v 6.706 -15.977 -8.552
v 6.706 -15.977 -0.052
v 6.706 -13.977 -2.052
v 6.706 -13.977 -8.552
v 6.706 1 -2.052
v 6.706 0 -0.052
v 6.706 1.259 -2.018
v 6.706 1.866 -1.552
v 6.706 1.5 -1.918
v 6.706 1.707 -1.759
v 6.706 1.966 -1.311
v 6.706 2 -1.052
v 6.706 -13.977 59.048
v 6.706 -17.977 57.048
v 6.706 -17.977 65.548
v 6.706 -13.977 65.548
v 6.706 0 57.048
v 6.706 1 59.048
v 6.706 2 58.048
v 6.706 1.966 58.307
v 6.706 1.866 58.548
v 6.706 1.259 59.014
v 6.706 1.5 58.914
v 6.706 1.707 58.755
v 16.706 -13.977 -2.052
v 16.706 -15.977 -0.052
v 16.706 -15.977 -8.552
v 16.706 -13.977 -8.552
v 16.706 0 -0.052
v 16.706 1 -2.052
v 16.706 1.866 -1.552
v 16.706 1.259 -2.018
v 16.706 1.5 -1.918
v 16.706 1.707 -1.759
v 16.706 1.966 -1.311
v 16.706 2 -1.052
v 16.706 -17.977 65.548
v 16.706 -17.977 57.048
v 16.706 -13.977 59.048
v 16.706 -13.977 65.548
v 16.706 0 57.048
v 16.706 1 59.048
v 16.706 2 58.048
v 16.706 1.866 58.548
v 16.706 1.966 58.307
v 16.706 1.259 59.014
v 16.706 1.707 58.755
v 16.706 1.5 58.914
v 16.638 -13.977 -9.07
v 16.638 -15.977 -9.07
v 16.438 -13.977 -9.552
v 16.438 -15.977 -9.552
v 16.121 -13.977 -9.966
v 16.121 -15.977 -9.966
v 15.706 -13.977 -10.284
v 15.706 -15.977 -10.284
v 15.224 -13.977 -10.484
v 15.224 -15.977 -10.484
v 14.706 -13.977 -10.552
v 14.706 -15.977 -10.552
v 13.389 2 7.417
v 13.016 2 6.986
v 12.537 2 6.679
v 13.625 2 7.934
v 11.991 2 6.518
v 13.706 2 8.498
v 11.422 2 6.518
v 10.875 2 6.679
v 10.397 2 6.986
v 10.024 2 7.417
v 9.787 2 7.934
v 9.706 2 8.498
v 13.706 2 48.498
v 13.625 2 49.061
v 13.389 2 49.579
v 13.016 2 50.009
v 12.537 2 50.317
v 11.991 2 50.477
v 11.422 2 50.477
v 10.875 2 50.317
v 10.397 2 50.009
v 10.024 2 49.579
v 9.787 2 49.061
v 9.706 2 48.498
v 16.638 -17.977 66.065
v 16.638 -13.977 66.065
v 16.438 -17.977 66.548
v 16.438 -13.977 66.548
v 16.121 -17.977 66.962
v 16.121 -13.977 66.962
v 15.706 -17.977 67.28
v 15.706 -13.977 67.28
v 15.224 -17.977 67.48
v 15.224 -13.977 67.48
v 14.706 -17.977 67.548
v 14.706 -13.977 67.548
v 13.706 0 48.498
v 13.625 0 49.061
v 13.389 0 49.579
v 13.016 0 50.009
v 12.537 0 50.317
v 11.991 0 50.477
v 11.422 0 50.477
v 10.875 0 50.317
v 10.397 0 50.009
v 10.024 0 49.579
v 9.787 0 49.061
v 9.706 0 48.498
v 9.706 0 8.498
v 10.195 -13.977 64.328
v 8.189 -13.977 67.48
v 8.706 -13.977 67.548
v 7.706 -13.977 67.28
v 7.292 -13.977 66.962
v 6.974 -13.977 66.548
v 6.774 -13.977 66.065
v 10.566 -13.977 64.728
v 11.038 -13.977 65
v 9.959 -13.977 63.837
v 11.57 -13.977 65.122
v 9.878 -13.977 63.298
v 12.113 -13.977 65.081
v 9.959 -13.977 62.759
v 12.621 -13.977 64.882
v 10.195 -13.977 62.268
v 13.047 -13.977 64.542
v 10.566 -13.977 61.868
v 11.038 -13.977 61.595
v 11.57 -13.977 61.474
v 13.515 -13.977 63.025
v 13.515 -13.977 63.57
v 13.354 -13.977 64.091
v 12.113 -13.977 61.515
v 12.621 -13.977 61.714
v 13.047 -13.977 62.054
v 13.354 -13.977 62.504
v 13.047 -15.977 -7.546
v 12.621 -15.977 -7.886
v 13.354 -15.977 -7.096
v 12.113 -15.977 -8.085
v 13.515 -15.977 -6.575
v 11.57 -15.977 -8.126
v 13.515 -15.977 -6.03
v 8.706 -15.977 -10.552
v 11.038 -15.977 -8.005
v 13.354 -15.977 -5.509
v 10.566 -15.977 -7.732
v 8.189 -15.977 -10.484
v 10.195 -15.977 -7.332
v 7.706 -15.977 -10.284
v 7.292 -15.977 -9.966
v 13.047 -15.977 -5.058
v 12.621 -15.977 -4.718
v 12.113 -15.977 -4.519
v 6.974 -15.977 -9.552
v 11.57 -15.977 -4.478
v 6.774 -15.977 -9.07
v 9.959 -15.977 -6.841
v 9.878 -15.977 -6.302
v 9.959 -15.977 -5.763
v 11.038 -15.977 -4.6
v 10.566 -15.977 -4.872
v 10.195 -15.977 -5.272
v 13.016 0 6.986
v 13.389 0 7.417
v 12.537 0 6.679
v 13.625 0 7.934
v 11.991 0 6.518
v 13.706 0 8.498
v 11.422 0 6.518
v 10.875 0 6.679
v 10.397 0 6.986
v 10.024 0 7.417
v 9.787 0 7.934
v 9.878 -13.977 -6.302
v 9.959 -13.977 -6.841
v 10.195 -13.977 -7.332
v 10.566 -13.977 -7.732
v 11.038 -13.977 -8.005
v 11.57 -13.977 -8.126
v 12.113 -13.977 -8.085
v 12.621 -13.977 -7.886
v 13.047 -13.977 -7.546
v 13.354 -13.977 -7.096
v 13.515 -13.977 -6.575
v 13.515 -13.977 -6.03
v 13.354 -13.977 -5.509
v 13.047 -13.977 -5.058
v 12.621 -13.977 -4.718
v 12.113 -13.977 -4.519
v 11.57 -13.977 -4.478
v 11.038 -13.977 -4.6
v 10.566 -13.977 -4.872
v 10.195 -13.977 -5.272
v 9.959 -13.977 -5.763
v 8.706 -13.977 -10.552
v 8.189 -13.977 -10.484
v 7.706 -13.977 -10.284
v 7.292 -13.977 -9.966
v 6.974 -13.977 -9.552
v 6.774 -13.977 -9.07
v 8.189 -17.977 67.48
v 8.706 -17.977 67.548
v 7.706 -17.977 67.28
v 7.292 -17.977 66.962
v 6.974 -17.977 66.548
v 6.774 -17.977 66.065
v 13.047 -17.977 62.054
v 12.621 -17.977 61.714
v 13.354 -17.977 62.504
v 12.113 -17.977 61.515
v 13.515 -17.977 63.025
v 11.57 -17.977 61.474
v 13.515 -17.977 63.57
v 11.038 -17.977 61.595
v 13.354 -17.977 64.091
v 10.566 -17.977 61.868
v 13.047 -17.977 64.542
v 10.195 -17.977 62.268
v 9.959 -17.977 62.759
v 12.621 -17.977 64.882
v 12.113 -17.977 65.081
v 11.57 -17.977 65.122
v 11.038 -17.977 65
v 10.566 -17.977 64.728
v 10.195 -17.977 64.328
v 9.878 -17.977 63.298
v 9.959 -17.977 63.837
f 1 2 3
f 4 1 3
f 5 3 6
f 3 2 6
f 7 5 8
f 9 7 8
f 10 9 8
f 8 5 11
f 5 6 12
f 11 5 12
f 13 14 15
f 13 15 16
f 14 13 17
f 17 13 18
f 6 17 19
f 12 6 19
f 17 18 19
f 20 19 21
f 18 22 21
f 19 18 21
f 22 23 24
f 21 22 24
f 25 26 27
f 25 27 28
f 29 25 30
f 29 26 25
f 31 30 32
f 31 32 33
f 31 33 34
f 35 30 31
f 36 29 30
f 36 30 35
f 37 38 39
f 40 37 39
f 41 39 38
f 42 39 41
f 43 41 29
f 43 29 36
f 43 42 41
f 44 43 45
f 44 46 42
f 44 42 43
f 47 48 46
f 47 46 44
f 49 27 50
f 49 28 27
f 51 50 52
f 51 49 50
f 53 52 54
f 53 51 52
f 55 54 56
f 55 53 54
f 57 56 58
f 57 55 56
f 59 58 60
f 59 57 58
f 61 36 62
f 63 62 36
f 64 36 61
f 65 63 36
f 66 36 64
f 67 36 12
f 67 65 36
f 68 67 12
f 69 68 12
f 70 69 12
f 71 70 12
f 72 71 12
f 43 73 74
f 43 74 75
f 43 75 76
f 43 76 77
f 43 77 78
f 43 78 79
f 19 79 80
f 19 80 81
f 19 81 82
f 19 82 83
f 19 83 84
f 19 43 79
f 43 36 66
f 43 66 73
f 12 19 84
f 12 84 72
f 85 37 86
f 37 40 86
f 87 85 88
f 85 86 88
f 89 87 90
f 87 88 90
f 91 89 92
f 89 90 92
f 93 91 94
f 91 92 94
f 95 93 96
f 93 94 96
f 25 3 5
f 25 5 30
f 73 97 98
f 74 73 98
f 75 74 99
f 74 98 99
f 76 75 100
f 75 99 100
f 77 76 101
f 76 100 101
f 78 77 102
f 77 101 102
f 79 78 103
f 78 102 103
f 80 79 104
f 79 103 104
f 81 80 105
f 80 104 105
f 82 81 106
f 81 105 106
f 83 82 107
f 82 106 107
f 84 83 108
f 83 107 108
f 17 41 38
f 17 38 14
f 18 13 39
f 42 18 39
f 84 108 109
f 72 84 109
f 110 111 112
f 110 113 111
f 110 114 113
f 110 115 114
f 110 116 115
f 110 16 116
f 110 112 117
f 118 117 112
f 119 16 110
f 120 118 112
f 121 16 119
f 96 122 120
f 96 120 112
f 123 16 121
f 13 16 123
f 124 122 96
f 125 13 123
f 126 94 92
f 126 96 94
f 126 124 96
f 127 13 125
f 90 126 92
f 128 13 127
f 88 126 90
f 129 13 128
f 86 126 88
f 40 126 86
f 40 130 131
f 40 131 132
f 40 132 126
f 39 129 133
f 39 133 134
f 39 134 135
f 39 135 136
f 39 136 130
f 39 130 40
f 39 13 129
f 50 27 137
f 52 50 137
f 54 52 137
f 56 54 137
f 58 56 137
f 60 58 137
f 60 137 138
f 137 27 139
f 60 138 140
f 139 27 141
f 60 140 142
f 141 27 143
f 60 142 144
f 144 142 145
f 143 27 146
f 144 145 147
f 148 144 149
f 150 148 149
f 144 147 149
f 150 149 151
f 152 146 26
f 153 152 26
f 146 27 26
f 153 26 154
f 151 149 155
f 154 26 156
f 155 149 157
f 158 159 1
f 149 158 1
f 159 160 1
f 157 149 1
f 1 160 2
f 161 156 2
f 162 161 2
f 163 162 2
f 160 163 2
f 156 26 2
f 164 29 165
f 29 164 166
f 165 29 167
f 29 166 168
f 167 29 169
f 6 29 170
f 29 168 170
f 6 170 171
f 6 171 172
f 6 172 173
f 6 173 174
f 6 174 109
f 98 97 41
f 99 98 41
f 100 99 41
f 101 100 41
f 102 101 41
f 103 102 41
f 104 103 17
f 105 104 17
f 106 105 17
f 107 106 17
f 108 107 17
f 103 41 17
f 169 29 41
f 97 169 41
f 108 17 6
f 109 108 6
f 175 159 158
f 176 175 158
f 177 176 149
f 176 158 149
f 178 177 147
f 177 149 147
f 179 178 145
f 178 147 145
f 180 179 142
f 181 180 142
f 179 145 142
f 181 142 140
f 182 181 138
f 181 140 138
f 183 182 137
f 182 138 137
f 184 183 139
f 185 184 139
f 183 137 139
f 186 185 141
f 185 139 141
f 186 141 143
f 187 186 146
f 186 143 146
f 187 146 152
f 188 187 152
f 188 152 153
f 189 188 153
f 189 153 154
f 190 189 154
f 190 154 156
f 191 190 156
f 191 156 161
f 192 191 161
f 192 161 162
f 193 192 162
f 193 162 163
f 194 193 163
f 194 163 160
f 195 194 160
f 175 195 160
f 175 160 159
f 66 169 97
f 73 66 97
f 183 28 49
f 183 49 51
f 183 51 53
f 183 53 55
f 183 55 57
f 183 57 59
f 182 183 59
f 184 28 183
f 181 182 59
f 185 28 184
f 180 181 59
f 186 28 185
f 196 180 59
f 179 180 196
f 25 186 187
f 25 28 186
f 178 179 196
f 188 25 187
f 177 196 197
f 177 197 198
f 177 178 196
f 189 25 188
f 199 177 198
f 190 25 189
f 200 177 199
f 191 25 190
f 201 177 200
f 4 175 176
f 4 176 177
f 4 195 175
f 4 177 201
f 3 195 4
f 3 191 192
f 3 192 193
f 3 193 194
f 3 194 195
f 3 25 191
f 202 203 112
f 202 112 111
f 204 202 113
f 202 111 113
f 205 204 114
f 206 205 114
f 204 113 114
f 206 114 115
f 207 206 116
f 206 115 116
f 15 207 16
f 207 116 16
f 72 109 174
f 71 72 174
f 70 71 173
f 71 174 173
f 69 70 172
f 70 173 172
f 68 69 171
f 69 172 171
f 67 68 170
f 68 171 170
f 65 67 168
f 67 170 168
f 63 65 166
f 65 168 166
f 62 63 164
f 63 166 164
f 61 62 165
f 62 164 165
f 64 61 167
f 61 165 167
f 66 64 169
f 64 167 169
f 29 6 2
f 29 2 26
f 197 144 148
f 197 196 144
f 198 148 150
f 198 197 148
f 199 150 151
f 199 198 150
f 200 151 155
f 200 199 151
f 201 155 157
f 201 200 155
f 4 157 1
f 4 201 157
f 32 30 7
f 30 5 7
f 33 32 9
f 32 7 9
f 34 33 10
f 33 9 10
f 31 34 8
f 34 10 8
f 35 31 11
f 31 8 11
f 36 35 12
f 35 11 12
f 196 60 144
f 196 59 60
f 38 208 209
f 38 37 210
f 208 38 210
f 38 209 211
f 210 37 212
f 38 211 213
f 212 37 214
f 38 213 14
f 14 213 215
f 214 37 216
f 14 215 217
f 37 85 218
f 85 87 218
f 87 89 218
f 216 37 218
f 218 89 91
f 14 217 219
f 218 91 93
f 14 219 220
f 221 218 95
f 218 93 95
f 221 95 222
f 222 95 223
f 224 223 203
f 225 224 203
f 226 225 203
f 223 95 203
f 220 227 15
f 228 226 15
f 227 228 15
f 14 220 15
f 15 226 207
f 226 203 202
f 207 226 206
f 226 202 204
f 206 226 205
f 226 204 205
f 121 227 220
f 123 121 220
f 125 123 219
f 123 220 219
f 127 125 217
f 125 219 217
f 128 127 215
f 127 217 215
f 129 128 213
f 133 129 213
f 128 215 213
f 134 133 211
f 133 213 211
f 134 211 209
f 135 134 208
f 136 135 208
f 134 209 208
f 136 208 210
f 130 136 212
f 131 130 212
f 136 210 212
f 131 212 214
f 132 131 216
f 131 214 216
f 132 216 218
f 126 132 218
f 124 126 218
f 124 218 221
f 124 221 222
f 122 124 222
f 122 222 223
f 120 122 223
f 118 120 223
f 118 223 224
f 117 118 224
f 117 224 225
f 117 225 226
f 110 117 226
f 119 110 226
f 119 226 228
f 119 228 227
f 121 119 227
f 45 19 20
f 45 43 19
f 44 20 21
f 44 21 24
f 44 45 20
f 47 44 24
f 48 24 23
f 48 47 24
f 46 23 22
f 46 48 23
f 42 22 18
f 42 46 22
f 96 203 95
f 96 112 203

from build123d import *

# Parameters (mm, degrees)
SKETCH4_W                 = 10
SKETCH4_H                 = 57
BOSS_EXTRUDE3_DEPTH       = 2
SKETCH5_W                 = 10
SKETCH5_H                 = 2
BOSS_EXTRUDE4_DEPTH       = 2.05
SKETCH6_W                 = 10
SKETCH6_H                 = 2
BOSS_EXTRUDE5_DEPTH       = 15.9766
SKETCH7_W                 = 10
SKETCH7_H                 = 4
BOSS_EXTRUDE6_DEPTH       = 8.5
SKETCH8_W                 = 10
SKETCH8_H                 = 2
BOSS_EXTRUDE7_DEPTH       = 2.05
SKETCH9_W                 = 10
SKETCH9_H                 = 2
BOSS_EXTRUDE8_DEPTH       = 15.9766
SKETCH10_W                = 10
SKETCH10_H                = 2
BOSS_EXTRUDE9_DEPTH       = 8.5
F_6_CLEARANCE_HOLE1_D     = 3.6576
F_6_CLEARANCE_HOLE1_DEPTH = 7.62
F_6_CLEARANCE_HOLE1_TIP   = 1.0988539
FILLET2_R                 = 1
FILLET3_R                 = 2
SKETCH16_W                = 10
SKETCH16_H                = 2
BOSS_EXTRUDE10_DEPTH      = 2


with BuildPart() as part:
    # Sketch4 → Boss-Extrude3 (new body)
    with BuildSketch(Plane(origin=(0, 0, 0), x_dir=(1, 0, 0), z_dir=(0, 1, 0))):
        with Locations((11.706300269, -28.497829615)):
            Rectangle(SKETCH4_W, SKETCH4_H)
        with BuildLine():
            Line((13.706300269, -8.497829615), (13.706300269, -48.497829615))
            ThreePointArc((13.706300269, -48.497829615), (11.706300269, -50.497829615), (9.706300269, -48.497829615))
            Line((9.706300269, -48.497829615), (9.706300269, -8.497829615))
            ThreePointArc((9.706300269, -8.497829615), (11.706300269, -6.497829615), (13.706300269, -8.497829615))
        make_face(mode=Mode.SUBTRACT)
    extrude(amount=BOSS_EXTRUDE3_DEPTH)

    # Sketch5 → Boss-Extrude4 (add)
    with BuildSketch(Plane.XY.offset(56.997829615)):
        with Locations((11.706300269, 1)):
            Rectangle(SKETCH5_W, SKETCH5_H)
    extrude(amount=BOSS_EXTRUDE4_DEPTH)

    # Sketch6 → Boss-Extrude5 (add)
    with BuildSketch(Plane.XZ):
        with Locations((11.706300269, 58.047829615)):
            Rectangle(SKETCH6_W, SKETCH6_H)
    extrude(amount=BOSS_EXTRUDE5_DEPTH)

    # Sketch7 → Boss-Extrude6 (add)
    with BuildSketch(Plane.XY.offset(59.047829615)):
        with Locations((11.706300269, -15.9766)):
            Rectangle(SKETCH7_W, SKETCH7_H)
    extrude(amount=BOSS_EXTRUDE6_DEPTH)

    # Sketch8 → Boss-Extrude7 (add)
    with BuildSketch(Plane(origin=(0, 0, -0.002170385), x_dir=(-1, 0, 0), z_dir=(0, 0, -1))):
        with Locations((-11.706300269, 1)):
            Rectangle(SKETCH8_W, SKETCH8_H)
    extrude(amount=BOSS_EXTRUDE7_DEPTH)

    # Sketch9 → Boss-Extrude8 (add)
    with BuildSketch(Plane.XZ):
        with Locations((11.706300269, -1.052170385)):
            Rectangle(SKETCH9_W, SKETCH9_H)
    extrude(amount=BOSS_EXTRUDE8_DEPTH)

    # Sketch10 → Boss-Extrude9 (add)
    with BuildSketch(Plane(origin=(0, 0, -2.052170385), x_dir=(-1, 0, 0), z_dir=(0, 0, -1))):
        with Locations((-11.706300269, -14.9766)):
            Rectangle(SKETCH10_W, SKETCH10_H)
    extrude(amount=BOSS_EXTRUDE9_DEPTH)

    # #6 Clearance Hole1
    with Locations(Plane(origin=(0, -13.9766, 0), x_dir=(1, 0, 0), z_dir=(0, 1, 0))):
        with Locations((11.706300269, -63.297829615), (11.706300269, 6.302170385)):
            Hole(F_6_CLEARANCE_HOLE1_D / 2, depth=F_6_CLEARANCE_HOLE1_DEPTH)
            with Locations((0, 0, -(F_6_CLEARANCE_HOLE1_DEPTH + F_6_CLEARANCE_HOLE1_TIP / 2))):  # 118° drill point
                Cone(0, F_6_CLEARANCE_HOLE1_D / 2, F_6_CLEARANCE_HOLE1_TIP, mode=Mode.SUBTRACT)

    # Fillet2
    fillet2_edges = [part.edges().sort_by_distance(p)[0] for p in [
        (11.706300269, 2, 59.047829615),
        (11.706300269, 2, -2.052170385),
    ]]
    fillet(fillet2_edges, radius=FILLET2_R)

    # Fillet3
    fillet3_edges = [part.edges().sort_by_distance(p)[0] for p in [
        (16.706300269, -15.9766, 67.547829615),
        (6.706300269, -15.9766, 67.547829615),
        (16.706300269, -14.9766, -10.552170385),
        (6.706300269, -14.9766, -10.552170385),
    ]]
    fillet(fillet3_edges, radius=FILLET3_R)

    # Sketch16 → Boss-Extrude10 (add)
    with BuildSketch(Plane(origin=(0, 0, 59.047829615), x_dir=(-1, 0, 0), z_dir=(0, 0, -1))):
        with Locations((-11.706300269, -16.9766)):
            Rectangle(SKETCH16_W, SKETCH16_H)
    extrude(amount=BOSS_EXTRUDE10_DEPTH)


solid = part.part
